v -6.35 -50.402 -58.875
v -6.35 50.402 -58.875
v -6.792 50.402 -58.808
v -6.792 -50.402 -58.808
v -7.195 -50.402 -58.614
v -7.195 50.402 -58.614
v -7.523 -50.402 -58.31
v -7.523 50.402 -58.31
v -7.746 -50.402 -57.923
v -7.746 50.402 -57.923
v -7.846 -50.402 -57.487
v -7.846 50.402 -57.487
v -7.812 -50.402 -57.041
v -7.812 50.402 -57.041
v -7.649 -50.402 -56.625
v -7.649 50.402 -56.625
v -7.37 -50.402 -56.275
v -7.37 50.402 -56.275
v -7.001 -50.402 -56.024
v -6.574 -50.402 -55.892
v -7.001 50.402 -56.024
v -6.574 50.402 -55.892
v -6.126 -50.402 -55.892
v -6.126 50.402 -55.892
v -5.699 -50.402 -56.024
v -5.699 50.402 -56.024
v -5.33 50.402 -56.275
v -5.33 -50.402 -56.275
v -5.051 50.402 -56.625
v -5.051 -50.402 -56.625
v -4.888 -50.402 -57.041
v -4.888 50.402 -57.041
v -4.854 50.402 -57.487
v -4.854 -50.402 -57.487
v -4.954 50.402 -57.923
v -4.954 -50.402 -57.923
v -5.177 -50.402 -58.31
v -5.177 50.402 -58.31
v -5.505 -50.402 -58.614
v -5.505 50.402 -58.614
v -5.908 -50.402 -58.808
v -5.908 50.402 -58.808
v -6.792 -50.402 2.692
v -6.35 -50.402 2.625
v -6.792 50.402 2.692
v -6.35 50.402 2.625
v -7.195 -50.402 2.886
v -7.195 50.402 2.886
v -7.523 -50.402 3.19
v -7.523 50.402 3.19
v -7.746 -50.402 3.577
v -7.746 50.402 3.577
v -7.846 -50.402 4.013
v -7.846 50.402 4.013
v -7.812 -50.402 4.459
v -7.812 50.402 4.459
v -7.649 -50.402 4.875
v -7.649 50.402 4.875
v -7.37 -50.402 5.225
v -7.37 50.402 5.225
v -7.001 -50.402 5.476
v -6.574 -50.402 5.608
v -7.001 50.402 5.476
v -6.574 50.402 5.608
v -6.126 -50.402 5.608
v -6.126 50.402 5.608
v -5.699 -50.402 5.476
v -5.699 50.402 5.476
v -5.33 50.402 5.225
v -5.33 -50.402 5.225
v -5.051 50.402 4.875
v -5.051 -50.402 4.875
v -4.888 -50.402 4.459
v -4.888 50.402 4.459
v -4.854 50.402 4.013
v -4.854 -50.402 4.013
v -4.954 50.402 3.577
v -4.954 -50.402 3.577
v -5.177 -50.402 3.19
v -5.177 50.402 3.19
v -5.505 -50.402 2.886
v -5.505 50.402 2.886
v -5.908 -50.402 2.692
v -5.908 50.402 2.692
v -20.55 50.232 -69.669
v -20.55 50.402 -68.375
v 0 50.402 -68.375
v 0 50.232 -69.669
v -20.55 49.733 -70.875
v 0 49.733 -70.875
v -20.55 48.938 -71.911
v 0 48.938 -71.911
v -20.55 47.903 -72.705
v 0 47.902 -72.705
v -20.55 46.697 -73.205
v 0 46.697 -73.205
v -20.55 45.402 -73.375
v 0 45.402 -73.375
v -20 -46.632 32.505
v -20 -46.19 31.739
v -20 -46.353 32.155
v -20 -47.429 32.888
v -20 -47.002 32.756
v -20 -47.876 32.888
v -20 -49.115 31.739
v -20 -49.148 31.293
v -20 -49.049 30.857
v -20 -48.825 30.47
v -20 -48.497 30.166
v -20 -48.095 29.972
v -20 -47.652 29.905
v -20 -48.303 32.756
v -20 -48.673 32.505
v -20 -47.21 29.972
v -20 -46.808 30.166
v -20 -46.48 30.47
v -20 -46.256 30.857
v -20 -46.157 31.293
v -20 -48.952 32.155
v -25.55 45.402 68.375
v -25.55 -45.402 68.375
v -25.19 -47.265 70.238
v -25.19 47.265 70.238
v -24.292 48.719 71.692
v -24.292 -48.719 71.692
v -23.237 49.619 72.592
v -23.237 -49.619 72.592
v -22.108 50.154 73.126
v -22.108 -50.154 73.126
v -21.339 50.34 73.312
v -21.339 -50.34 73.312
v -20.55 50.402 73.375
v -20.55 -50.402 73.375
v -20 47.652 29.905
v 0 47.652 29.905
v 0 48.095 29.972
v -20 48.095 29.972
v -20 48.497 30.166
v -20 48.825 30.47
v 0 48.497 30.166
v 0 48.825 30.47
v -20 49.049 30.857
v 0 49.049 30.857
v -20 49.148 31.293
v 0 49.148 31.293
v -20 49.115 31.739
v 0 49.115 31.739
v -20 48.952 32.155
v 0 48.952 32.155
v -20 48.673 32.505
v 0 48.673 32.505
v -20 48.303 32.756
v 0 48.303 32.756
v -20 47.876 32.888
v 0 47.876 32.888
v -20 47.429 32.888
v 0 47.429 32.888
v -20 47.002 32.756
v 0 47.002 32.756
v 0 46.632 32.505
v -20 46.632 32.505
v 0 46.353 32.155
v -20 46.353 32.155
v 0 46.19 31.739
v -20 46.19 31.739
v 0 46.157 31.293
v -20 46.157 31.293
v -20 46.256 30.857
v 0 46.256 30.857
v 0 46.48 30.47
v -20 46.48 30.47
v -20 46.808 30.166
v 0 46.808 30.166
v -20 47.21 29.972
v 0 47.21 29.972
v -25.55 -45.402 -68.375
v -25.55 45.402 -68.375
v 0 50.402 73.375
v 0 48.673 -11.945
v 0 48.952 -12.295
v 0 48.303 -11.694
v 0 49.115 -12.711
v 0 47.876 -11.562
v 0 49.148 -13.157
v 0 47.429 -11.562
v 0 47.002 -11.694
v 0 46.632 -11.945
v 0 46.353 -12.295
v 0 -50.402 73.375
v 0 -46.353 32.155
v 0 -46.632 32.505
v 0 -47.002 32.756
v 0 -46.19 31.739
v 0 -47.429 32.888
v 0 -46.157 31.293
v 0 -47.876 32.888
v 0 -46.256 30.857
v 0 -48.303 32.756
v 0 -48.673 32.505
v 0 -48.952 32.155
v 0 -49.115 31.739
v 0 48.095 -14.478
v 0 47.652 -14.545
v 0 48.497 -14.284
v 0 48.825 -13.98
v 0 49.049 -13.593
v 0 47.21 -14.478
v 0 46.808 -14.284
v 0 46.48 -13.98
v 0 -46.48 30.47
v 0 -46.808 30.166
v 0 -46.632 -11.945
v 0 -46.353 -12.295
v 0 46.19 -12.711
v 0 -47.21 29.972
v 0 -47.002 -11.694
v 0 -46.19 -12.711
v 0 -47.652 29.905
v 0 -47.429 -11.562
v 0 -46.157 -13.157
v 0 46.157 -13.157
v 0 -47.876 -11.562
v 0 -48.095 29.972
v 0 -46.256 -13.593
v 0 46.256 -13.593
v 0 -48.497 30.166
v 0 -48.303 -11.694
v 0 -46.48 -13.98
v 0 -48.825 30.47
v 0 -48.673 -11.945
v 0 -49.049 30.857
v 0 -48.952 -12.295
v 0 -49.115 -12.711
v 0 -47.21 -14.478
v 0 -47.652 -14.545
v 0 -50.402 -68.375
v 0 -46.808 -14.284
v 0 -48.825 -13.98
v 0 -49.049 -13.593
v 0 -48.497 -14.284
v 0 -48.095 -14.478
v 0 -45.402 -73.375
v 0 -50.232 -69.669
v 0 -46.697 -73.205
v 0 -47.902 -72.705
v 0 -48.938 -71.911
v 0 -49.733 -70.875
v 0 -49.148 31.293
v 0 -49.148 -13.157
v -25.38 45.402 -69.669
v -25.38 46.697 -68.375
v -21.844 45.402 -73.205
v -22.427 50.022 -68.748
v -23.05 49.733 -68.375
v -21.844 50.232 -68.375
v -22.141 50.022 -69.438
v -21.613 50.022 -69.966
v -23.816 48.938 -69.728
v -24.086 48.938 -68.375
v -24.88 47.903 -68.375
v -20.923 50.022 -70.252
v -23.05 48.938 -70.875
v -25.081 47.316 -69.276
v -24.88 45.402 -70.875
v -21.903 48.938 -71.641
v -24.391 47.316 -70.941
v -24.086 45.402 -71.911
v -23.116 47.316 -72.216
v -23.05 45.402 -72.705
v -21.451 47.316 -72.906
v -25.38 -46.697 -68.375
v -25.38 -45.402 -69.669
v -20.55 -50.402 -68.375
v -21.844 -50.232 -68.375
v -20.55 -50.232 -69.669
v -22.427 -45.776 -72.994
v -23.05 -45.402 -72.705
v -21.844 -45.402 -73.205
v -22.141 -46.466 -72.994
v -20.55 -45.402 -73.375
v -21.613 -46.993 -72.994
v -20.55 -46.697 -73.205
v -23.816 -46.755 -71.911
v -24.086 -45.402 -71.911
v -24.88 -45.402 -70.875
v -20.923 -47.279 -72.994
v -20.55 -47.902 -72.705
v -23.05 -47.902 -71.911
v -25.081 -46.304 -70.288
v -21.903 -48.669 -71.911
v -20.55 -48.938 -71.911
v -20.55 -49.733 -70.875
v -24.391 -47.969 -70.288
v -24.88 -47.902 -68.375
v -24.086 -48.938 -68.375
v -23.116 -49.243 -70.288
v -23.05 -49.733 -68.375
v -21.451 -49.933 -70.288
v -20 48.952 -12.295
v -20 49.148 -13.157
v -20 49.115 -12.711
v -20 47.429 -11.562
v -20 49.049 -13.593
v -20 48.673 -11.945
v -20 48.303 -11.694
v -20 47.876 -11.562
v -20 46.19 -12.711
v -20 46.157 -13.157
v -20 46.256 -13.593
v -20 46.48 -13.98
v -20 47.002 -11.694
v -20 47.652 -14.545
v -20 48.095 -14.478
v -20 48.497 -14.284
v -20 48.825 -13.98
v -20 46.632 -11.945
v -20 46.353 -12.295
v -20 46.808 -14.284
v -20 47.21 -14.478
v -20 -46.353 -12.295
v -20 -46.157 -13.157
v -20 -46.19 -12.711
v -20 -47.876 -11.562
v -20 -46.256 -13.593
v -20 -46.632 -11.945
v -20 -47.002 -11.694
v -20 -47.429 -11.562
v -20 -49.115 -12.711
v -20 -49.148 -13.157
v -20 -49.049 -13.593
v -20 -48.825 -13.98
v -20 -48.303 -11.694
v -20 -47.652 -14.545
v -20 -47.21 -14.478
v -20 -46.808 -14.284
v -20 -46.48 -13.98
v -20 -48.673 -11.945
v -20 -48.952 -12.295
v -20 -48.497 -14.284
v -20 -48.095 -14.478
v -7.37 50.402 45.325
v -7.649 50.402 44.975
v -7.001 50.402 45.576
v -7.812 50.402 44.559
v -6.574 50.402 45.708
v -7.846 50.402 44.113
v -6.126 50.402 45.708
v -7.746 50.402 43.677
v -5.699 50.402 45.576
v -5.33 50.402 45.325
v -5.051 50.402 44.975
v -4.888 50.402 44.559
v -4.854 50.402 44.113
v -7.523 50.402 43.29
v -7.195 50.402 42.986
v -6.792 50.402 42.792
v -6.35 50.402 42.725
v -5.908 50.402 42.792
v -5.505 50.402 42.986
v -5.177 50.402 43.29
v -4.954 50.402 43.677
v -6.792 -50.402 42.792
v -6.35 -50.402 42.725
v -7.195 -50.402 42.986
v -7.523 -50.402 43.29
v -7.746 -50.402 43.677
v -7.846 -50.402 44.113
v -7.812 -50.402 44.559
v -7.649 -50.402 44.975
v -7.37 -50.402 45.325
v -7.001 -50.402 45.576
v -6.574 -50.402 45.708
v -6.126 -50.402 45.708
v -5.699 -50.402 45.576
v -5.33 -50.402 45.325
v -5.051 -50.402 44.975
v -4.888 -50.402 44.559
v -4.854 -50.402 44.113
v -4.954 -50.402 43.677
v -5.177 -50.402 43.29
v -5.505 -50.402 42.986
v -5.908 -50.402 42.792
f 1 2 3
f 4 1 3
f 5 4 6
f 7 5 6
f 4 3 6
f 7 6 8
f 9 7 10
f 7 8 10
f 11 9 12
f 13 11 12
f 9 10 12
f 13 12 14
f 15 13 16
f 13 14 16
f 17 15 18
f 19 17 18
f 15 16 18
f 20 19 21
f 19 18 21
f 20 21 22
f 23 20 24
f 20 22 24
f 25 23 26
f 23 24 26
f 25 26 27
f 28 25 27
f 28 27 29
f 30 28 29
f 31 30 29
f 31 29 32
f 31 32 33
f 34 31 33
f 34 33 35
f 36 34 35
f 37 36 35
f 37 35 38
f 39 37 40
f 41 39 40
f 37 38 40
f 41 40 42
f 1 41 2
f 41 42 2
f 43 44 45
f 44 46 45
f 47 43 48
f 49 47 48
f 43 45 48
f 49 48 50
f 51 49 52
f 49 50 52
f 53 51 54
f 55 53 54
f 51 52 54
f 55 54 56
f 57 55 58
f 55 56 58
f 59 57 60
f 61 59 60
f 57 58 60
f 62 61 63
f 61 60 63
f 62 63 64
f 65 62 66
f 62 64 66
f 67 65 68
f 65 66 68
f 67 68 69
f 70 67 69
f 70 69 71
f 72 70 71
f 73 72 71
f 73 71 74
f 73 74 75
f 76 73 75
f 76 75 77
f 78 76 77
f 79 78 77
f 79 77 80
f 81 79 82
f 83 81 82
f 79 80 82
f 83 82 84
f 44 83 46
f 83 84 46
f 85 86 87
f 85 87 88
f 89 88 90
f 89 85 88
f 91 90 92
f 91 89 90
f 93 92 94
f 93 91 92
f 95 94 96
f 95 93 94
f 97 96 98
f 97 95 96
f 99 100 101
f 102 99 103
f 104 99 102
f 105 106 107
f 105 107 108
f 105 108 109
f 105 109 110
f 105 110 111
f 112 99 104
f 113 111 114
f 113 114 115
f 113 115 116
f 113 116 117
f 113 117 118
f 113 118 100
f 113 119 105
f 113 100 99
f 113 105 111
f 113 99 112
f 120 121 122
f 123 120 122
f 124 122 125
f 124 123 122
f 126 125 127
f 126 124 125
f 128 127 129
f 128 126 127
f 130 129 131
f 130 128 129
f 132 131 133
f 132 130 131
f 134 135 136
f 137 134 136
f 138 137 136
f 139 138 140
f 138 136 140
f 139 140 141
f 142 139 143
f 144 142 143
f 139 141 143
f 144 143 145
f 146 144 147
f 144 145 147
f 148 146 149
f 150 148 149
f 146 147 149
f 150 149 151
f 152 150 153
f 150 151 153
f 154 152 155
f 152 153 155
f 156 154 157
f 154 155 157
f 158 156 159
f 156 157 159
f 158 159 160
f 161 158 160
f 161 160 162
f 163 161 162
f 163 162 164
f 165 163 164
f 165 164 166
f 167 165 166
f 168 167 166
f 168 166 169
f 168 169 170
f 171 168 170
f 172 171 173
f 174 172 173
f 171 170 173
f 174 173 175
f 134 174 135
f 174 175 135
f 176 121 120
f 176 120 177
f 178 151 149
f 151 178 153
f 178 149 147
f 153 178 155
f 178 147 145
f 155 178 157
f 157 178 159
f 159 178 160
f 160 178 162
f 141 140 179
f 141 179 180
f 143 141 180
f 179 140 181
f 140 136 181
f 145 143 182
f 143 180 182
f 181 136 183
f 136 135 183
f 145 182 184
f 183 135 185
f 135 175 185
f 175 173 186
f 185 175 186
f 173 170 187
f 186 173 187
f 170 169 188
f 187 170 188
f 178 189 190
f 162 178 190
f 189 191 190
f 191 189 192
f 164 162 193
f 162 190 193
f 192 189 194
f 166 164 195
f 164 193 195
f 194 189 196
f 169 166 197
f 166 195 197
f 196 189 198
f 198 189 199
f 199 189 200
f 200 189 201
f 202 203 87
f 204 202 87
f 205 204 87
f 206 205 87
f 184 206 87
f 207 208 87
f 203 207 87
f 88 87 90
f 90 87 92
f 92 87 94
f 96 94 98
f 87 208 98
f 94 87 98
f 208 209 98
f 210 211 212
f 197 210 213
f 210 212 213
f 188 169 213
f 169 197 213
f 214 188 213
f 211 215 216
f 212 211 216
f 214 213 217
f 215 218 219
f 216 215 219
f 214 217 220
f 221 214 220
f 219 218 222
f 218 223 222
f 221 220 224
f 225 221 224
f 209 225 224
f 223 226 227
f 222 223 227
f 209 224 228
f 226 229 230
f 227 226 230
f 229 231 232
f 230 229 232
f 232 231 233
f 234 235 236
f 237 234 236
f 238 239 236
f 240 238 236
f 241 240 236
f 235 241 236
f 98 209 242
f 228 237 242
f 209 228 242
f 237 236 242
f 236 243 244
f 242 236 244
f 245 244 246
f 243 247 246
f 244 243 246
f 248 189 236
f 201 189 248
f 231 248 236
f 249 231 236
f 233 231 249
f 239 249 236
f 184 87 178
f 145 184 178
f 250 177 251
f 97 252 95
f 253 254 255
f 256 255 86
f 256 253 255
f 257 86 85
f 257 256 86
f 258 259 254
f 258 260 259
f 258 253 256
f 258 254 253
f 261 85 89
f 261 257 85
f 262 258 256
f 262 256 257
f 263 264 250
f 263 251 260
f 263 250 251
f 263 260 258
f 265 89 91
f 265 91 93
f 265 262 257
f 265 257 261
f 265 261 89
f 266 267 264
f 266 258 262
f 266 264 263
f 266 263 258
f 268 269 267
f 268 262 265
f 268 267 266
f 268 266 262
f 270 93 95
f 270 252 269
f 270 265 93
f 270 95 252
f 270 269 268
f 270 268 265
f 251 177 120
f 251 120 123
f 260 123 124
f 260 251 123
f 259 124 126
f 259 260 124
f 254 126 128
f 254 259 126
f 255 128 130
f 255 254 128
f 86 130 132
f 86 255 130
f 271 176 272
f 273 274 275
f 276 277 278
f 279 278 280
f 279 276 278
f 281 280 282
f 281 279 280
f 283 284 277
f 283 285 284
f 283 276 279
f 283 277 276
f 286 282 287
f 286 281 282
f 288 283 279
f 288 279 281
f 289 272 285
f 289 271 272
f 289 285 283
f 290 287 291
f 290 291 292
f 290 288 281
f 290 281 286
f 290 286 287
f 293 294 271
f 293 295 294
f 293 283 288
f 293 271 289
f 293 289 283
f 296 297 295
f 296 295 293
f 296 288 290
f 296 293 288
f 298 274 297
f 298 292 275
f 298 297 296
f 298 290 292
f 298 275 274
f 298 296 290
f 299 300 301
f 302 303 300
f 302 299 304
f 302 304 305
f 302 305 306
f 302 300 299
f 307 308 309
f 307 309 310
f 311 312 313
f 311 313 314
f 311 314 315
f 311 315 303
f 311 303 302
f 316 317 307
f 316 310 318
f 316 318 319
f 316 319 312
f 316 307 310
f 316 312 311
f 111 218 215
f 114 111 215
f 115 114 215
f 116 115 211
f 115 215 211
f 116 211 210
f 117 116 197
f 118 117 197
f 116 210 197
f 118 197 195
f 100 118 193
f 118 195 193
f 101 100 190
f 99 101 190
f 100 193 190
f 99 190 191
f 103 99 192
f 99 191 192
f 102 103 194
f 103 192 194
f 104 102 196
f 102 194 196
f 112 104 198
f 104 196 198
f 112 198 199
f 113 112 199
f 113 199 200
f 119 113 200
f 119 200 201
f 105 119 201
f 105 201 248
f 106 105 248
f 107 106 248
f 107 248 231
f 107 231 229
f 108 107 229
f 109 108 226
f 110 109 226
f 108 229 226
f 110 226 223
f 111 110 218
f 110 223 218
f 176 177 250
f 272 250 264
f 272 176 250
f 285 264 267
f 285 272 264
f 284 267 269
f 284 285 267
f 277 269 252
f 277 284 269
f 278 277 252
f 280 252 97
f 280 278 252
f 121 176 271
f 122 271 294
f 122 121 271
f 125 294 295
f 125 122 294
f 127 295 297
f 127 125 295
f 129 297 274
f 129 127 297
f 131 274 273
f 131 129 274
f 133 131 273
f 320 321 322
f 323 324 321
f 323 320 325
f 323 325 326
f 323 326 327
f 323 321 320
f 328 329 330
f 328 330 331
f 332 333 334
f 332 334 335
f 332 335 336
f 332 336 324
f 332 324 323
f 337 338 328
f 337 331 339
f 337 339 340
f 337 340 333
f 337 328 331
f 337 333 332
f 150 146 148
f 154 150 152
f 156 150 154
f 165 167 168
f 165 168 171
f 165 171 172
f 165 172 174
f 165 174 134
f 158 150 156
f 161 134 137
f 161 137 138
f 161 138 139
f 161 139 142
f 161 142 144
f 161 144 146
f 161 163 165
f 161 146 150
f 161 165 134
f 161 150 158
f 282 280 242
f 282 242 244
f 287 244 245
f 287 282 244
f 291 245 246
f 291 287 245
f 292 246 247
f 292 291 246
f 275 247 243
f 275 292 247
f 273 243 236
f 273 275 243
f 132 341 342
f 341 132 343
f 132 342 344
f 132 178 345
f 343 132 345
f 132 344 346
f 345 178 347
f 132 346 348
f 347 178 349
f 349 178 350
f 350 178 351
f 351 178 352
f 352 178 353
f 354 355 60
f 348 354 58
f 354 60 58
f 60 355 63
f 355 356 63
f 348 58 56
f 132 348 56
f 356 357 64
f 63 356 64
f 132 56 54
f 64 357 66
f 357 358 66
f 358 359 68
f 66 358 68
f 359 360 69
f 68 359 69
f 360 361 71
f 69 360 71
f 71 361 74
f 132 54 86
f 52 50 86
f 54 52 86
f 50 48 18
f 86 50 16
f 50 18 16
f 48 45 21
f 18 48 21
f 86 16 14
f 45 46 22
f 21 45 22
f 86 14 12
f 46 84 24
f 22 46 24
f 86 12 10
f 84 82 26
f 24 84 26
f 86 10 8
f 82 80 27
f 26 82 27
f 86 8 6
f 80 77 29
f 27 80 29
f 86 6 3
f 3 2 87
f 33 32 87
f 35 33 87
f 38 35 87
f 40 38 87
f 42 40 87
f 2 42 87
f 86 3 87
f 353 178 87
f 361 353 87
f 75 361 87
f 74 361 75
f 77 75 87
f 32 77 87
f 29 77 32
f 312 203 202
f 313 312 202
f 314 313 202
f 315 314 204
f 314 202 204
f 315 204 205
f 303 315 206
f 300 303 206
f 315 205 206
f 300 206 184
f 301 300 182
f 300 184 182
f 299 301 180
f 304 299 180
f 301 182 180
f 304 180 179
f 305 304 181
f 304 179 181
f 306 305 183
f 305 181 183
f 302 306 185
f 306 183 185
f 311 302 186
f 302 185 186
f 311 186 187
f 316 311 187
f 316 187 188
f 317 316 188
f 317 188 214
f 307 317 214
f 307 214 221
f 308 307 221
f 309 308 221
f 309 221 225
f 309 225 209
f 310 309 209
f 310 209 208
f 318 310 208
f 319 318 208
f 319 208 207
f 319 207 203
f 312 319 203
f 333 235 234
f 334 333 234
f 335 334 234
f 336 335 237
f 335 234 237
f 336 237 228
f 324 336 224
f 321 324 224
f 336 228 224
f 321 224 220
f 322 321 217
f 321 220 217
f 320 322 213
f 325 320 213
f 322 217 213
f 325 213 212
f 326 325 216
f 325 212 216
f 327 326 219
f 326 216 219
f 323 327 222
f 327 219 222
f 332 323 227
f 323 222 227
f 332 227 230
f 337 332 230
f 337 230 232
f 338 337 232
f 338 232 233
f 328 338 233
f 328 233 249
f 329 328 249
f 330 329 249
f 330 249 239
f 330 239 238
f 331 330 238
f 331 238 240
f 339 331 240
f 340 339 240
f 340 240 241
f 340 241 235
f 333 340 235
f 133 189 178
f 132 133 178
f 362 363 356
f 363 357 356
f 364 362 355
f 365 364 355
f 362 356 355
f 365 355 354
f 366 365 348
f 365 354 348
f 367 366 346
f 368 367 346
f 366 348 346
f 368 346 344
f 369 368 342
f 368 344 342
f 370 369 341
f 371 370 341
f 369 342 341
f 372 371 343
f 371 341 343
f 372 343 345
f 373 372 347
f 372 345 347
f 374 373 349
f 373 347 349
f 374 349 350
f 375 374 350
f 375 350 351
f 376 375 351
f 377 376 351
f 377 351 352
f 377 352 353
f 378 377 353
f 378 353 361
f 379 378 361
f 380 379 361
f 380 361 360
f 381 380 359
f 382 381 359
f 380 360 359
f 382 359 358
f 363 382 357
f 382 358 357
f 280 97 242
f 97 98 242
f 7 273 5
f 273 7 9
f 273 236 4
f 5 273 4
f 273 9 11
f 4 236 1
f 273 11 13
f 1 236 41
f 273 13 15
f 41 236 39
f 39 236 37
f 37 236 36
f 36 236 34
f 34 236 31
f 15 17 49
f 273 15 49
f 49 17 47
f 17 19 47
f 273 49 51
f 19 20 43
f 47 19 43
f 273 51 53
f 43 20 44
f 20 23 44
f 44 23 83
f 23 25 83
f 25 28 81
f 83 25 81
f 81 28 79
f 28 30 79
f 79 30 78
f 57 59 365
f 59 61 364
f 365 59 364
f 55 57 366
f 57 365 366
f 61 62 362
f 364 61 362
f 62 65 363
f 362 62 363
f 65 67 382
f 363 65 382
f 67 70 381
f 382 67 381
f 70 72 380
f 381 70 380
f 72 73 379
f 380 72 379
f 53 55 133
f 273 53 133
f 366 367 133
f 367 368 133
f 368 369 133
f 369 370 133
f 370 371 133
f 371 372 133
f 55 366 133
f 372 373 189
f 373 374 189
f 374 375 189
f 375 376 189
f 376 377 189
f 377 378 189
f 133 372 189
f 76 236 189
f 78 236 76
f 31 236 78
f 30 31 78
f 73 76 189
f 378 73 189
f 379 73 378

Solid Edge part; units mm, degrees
sketch "Sketch1" plane through (0, 0, 0) normal (-1, 0, 0) x (0, -1, 0)
  line L0 (-50.4025, -73.375) -> (50.4025, -73.375)
  line L1 (50.4025, -73.375) -> (50.4025, 73.375)
  line L2 (50.4025, 73.375) -> (-50.4025, 73.375)
  line L3 (-50.4025, 73.375) -> (-50.4025, -73.375)
  dimension "D1" = 100.805
  dimension "D2" = 146.75
extrude "Protrusion1" add sketch "Sketch1" along normal blind 25.55
sketch "Sketch2" plane through (-12.775, 50.4025, 0) normal (0, 1, 0) x (0, 0, -1)
  circle A0 centre (-44.225, -6.425) radius 1.5
  circle A1 centre (-4.125, -6.425) radius 1.5
  circle A2 centre (57.375, -6.425) radius 1.5
  dimension "D1" = 3
  dimension "D2" = 3
  dimension "D3" = 3
  dimension "D4" = 6.35
  dimension "D5" = 101.6
  dimension "D6" = 60
  dimension "D7" = 16
extrude "Cutout1" cut sketch "Sketch2" along normal mid plane 330
sketch "Sketch3" plane through (0, 0, 0) normal (1, 0, 0) x (0, 0, -1)
  circle A0 centre (-31.405, 47.6525) radius 1.5
  circle A1 centre (13.045, 47.6525) radius 1.5
  circle A2 centre (-31.405, -47.6525) radius 1.5
  circle A3 centre (13.045, -47.6525) radius 1.5
  dimension "D1" = 3
  dimension "D2" = 3
  dimension "D3" = 3
  dimension "D4" = 3
extrude "Cutout2" cut sketch "Sketch3" against normal blind 20
fillet "Round_6" radius 5 6 edges at (-25.55, 0, 73.375) (-25.55, -50.4025, 0) (-25.55, 0, -73.375) (-25.55, 50.4025, 0) (-12.775, 50.4025, -73.375) (-12.775, -50.4025, -73.375)
